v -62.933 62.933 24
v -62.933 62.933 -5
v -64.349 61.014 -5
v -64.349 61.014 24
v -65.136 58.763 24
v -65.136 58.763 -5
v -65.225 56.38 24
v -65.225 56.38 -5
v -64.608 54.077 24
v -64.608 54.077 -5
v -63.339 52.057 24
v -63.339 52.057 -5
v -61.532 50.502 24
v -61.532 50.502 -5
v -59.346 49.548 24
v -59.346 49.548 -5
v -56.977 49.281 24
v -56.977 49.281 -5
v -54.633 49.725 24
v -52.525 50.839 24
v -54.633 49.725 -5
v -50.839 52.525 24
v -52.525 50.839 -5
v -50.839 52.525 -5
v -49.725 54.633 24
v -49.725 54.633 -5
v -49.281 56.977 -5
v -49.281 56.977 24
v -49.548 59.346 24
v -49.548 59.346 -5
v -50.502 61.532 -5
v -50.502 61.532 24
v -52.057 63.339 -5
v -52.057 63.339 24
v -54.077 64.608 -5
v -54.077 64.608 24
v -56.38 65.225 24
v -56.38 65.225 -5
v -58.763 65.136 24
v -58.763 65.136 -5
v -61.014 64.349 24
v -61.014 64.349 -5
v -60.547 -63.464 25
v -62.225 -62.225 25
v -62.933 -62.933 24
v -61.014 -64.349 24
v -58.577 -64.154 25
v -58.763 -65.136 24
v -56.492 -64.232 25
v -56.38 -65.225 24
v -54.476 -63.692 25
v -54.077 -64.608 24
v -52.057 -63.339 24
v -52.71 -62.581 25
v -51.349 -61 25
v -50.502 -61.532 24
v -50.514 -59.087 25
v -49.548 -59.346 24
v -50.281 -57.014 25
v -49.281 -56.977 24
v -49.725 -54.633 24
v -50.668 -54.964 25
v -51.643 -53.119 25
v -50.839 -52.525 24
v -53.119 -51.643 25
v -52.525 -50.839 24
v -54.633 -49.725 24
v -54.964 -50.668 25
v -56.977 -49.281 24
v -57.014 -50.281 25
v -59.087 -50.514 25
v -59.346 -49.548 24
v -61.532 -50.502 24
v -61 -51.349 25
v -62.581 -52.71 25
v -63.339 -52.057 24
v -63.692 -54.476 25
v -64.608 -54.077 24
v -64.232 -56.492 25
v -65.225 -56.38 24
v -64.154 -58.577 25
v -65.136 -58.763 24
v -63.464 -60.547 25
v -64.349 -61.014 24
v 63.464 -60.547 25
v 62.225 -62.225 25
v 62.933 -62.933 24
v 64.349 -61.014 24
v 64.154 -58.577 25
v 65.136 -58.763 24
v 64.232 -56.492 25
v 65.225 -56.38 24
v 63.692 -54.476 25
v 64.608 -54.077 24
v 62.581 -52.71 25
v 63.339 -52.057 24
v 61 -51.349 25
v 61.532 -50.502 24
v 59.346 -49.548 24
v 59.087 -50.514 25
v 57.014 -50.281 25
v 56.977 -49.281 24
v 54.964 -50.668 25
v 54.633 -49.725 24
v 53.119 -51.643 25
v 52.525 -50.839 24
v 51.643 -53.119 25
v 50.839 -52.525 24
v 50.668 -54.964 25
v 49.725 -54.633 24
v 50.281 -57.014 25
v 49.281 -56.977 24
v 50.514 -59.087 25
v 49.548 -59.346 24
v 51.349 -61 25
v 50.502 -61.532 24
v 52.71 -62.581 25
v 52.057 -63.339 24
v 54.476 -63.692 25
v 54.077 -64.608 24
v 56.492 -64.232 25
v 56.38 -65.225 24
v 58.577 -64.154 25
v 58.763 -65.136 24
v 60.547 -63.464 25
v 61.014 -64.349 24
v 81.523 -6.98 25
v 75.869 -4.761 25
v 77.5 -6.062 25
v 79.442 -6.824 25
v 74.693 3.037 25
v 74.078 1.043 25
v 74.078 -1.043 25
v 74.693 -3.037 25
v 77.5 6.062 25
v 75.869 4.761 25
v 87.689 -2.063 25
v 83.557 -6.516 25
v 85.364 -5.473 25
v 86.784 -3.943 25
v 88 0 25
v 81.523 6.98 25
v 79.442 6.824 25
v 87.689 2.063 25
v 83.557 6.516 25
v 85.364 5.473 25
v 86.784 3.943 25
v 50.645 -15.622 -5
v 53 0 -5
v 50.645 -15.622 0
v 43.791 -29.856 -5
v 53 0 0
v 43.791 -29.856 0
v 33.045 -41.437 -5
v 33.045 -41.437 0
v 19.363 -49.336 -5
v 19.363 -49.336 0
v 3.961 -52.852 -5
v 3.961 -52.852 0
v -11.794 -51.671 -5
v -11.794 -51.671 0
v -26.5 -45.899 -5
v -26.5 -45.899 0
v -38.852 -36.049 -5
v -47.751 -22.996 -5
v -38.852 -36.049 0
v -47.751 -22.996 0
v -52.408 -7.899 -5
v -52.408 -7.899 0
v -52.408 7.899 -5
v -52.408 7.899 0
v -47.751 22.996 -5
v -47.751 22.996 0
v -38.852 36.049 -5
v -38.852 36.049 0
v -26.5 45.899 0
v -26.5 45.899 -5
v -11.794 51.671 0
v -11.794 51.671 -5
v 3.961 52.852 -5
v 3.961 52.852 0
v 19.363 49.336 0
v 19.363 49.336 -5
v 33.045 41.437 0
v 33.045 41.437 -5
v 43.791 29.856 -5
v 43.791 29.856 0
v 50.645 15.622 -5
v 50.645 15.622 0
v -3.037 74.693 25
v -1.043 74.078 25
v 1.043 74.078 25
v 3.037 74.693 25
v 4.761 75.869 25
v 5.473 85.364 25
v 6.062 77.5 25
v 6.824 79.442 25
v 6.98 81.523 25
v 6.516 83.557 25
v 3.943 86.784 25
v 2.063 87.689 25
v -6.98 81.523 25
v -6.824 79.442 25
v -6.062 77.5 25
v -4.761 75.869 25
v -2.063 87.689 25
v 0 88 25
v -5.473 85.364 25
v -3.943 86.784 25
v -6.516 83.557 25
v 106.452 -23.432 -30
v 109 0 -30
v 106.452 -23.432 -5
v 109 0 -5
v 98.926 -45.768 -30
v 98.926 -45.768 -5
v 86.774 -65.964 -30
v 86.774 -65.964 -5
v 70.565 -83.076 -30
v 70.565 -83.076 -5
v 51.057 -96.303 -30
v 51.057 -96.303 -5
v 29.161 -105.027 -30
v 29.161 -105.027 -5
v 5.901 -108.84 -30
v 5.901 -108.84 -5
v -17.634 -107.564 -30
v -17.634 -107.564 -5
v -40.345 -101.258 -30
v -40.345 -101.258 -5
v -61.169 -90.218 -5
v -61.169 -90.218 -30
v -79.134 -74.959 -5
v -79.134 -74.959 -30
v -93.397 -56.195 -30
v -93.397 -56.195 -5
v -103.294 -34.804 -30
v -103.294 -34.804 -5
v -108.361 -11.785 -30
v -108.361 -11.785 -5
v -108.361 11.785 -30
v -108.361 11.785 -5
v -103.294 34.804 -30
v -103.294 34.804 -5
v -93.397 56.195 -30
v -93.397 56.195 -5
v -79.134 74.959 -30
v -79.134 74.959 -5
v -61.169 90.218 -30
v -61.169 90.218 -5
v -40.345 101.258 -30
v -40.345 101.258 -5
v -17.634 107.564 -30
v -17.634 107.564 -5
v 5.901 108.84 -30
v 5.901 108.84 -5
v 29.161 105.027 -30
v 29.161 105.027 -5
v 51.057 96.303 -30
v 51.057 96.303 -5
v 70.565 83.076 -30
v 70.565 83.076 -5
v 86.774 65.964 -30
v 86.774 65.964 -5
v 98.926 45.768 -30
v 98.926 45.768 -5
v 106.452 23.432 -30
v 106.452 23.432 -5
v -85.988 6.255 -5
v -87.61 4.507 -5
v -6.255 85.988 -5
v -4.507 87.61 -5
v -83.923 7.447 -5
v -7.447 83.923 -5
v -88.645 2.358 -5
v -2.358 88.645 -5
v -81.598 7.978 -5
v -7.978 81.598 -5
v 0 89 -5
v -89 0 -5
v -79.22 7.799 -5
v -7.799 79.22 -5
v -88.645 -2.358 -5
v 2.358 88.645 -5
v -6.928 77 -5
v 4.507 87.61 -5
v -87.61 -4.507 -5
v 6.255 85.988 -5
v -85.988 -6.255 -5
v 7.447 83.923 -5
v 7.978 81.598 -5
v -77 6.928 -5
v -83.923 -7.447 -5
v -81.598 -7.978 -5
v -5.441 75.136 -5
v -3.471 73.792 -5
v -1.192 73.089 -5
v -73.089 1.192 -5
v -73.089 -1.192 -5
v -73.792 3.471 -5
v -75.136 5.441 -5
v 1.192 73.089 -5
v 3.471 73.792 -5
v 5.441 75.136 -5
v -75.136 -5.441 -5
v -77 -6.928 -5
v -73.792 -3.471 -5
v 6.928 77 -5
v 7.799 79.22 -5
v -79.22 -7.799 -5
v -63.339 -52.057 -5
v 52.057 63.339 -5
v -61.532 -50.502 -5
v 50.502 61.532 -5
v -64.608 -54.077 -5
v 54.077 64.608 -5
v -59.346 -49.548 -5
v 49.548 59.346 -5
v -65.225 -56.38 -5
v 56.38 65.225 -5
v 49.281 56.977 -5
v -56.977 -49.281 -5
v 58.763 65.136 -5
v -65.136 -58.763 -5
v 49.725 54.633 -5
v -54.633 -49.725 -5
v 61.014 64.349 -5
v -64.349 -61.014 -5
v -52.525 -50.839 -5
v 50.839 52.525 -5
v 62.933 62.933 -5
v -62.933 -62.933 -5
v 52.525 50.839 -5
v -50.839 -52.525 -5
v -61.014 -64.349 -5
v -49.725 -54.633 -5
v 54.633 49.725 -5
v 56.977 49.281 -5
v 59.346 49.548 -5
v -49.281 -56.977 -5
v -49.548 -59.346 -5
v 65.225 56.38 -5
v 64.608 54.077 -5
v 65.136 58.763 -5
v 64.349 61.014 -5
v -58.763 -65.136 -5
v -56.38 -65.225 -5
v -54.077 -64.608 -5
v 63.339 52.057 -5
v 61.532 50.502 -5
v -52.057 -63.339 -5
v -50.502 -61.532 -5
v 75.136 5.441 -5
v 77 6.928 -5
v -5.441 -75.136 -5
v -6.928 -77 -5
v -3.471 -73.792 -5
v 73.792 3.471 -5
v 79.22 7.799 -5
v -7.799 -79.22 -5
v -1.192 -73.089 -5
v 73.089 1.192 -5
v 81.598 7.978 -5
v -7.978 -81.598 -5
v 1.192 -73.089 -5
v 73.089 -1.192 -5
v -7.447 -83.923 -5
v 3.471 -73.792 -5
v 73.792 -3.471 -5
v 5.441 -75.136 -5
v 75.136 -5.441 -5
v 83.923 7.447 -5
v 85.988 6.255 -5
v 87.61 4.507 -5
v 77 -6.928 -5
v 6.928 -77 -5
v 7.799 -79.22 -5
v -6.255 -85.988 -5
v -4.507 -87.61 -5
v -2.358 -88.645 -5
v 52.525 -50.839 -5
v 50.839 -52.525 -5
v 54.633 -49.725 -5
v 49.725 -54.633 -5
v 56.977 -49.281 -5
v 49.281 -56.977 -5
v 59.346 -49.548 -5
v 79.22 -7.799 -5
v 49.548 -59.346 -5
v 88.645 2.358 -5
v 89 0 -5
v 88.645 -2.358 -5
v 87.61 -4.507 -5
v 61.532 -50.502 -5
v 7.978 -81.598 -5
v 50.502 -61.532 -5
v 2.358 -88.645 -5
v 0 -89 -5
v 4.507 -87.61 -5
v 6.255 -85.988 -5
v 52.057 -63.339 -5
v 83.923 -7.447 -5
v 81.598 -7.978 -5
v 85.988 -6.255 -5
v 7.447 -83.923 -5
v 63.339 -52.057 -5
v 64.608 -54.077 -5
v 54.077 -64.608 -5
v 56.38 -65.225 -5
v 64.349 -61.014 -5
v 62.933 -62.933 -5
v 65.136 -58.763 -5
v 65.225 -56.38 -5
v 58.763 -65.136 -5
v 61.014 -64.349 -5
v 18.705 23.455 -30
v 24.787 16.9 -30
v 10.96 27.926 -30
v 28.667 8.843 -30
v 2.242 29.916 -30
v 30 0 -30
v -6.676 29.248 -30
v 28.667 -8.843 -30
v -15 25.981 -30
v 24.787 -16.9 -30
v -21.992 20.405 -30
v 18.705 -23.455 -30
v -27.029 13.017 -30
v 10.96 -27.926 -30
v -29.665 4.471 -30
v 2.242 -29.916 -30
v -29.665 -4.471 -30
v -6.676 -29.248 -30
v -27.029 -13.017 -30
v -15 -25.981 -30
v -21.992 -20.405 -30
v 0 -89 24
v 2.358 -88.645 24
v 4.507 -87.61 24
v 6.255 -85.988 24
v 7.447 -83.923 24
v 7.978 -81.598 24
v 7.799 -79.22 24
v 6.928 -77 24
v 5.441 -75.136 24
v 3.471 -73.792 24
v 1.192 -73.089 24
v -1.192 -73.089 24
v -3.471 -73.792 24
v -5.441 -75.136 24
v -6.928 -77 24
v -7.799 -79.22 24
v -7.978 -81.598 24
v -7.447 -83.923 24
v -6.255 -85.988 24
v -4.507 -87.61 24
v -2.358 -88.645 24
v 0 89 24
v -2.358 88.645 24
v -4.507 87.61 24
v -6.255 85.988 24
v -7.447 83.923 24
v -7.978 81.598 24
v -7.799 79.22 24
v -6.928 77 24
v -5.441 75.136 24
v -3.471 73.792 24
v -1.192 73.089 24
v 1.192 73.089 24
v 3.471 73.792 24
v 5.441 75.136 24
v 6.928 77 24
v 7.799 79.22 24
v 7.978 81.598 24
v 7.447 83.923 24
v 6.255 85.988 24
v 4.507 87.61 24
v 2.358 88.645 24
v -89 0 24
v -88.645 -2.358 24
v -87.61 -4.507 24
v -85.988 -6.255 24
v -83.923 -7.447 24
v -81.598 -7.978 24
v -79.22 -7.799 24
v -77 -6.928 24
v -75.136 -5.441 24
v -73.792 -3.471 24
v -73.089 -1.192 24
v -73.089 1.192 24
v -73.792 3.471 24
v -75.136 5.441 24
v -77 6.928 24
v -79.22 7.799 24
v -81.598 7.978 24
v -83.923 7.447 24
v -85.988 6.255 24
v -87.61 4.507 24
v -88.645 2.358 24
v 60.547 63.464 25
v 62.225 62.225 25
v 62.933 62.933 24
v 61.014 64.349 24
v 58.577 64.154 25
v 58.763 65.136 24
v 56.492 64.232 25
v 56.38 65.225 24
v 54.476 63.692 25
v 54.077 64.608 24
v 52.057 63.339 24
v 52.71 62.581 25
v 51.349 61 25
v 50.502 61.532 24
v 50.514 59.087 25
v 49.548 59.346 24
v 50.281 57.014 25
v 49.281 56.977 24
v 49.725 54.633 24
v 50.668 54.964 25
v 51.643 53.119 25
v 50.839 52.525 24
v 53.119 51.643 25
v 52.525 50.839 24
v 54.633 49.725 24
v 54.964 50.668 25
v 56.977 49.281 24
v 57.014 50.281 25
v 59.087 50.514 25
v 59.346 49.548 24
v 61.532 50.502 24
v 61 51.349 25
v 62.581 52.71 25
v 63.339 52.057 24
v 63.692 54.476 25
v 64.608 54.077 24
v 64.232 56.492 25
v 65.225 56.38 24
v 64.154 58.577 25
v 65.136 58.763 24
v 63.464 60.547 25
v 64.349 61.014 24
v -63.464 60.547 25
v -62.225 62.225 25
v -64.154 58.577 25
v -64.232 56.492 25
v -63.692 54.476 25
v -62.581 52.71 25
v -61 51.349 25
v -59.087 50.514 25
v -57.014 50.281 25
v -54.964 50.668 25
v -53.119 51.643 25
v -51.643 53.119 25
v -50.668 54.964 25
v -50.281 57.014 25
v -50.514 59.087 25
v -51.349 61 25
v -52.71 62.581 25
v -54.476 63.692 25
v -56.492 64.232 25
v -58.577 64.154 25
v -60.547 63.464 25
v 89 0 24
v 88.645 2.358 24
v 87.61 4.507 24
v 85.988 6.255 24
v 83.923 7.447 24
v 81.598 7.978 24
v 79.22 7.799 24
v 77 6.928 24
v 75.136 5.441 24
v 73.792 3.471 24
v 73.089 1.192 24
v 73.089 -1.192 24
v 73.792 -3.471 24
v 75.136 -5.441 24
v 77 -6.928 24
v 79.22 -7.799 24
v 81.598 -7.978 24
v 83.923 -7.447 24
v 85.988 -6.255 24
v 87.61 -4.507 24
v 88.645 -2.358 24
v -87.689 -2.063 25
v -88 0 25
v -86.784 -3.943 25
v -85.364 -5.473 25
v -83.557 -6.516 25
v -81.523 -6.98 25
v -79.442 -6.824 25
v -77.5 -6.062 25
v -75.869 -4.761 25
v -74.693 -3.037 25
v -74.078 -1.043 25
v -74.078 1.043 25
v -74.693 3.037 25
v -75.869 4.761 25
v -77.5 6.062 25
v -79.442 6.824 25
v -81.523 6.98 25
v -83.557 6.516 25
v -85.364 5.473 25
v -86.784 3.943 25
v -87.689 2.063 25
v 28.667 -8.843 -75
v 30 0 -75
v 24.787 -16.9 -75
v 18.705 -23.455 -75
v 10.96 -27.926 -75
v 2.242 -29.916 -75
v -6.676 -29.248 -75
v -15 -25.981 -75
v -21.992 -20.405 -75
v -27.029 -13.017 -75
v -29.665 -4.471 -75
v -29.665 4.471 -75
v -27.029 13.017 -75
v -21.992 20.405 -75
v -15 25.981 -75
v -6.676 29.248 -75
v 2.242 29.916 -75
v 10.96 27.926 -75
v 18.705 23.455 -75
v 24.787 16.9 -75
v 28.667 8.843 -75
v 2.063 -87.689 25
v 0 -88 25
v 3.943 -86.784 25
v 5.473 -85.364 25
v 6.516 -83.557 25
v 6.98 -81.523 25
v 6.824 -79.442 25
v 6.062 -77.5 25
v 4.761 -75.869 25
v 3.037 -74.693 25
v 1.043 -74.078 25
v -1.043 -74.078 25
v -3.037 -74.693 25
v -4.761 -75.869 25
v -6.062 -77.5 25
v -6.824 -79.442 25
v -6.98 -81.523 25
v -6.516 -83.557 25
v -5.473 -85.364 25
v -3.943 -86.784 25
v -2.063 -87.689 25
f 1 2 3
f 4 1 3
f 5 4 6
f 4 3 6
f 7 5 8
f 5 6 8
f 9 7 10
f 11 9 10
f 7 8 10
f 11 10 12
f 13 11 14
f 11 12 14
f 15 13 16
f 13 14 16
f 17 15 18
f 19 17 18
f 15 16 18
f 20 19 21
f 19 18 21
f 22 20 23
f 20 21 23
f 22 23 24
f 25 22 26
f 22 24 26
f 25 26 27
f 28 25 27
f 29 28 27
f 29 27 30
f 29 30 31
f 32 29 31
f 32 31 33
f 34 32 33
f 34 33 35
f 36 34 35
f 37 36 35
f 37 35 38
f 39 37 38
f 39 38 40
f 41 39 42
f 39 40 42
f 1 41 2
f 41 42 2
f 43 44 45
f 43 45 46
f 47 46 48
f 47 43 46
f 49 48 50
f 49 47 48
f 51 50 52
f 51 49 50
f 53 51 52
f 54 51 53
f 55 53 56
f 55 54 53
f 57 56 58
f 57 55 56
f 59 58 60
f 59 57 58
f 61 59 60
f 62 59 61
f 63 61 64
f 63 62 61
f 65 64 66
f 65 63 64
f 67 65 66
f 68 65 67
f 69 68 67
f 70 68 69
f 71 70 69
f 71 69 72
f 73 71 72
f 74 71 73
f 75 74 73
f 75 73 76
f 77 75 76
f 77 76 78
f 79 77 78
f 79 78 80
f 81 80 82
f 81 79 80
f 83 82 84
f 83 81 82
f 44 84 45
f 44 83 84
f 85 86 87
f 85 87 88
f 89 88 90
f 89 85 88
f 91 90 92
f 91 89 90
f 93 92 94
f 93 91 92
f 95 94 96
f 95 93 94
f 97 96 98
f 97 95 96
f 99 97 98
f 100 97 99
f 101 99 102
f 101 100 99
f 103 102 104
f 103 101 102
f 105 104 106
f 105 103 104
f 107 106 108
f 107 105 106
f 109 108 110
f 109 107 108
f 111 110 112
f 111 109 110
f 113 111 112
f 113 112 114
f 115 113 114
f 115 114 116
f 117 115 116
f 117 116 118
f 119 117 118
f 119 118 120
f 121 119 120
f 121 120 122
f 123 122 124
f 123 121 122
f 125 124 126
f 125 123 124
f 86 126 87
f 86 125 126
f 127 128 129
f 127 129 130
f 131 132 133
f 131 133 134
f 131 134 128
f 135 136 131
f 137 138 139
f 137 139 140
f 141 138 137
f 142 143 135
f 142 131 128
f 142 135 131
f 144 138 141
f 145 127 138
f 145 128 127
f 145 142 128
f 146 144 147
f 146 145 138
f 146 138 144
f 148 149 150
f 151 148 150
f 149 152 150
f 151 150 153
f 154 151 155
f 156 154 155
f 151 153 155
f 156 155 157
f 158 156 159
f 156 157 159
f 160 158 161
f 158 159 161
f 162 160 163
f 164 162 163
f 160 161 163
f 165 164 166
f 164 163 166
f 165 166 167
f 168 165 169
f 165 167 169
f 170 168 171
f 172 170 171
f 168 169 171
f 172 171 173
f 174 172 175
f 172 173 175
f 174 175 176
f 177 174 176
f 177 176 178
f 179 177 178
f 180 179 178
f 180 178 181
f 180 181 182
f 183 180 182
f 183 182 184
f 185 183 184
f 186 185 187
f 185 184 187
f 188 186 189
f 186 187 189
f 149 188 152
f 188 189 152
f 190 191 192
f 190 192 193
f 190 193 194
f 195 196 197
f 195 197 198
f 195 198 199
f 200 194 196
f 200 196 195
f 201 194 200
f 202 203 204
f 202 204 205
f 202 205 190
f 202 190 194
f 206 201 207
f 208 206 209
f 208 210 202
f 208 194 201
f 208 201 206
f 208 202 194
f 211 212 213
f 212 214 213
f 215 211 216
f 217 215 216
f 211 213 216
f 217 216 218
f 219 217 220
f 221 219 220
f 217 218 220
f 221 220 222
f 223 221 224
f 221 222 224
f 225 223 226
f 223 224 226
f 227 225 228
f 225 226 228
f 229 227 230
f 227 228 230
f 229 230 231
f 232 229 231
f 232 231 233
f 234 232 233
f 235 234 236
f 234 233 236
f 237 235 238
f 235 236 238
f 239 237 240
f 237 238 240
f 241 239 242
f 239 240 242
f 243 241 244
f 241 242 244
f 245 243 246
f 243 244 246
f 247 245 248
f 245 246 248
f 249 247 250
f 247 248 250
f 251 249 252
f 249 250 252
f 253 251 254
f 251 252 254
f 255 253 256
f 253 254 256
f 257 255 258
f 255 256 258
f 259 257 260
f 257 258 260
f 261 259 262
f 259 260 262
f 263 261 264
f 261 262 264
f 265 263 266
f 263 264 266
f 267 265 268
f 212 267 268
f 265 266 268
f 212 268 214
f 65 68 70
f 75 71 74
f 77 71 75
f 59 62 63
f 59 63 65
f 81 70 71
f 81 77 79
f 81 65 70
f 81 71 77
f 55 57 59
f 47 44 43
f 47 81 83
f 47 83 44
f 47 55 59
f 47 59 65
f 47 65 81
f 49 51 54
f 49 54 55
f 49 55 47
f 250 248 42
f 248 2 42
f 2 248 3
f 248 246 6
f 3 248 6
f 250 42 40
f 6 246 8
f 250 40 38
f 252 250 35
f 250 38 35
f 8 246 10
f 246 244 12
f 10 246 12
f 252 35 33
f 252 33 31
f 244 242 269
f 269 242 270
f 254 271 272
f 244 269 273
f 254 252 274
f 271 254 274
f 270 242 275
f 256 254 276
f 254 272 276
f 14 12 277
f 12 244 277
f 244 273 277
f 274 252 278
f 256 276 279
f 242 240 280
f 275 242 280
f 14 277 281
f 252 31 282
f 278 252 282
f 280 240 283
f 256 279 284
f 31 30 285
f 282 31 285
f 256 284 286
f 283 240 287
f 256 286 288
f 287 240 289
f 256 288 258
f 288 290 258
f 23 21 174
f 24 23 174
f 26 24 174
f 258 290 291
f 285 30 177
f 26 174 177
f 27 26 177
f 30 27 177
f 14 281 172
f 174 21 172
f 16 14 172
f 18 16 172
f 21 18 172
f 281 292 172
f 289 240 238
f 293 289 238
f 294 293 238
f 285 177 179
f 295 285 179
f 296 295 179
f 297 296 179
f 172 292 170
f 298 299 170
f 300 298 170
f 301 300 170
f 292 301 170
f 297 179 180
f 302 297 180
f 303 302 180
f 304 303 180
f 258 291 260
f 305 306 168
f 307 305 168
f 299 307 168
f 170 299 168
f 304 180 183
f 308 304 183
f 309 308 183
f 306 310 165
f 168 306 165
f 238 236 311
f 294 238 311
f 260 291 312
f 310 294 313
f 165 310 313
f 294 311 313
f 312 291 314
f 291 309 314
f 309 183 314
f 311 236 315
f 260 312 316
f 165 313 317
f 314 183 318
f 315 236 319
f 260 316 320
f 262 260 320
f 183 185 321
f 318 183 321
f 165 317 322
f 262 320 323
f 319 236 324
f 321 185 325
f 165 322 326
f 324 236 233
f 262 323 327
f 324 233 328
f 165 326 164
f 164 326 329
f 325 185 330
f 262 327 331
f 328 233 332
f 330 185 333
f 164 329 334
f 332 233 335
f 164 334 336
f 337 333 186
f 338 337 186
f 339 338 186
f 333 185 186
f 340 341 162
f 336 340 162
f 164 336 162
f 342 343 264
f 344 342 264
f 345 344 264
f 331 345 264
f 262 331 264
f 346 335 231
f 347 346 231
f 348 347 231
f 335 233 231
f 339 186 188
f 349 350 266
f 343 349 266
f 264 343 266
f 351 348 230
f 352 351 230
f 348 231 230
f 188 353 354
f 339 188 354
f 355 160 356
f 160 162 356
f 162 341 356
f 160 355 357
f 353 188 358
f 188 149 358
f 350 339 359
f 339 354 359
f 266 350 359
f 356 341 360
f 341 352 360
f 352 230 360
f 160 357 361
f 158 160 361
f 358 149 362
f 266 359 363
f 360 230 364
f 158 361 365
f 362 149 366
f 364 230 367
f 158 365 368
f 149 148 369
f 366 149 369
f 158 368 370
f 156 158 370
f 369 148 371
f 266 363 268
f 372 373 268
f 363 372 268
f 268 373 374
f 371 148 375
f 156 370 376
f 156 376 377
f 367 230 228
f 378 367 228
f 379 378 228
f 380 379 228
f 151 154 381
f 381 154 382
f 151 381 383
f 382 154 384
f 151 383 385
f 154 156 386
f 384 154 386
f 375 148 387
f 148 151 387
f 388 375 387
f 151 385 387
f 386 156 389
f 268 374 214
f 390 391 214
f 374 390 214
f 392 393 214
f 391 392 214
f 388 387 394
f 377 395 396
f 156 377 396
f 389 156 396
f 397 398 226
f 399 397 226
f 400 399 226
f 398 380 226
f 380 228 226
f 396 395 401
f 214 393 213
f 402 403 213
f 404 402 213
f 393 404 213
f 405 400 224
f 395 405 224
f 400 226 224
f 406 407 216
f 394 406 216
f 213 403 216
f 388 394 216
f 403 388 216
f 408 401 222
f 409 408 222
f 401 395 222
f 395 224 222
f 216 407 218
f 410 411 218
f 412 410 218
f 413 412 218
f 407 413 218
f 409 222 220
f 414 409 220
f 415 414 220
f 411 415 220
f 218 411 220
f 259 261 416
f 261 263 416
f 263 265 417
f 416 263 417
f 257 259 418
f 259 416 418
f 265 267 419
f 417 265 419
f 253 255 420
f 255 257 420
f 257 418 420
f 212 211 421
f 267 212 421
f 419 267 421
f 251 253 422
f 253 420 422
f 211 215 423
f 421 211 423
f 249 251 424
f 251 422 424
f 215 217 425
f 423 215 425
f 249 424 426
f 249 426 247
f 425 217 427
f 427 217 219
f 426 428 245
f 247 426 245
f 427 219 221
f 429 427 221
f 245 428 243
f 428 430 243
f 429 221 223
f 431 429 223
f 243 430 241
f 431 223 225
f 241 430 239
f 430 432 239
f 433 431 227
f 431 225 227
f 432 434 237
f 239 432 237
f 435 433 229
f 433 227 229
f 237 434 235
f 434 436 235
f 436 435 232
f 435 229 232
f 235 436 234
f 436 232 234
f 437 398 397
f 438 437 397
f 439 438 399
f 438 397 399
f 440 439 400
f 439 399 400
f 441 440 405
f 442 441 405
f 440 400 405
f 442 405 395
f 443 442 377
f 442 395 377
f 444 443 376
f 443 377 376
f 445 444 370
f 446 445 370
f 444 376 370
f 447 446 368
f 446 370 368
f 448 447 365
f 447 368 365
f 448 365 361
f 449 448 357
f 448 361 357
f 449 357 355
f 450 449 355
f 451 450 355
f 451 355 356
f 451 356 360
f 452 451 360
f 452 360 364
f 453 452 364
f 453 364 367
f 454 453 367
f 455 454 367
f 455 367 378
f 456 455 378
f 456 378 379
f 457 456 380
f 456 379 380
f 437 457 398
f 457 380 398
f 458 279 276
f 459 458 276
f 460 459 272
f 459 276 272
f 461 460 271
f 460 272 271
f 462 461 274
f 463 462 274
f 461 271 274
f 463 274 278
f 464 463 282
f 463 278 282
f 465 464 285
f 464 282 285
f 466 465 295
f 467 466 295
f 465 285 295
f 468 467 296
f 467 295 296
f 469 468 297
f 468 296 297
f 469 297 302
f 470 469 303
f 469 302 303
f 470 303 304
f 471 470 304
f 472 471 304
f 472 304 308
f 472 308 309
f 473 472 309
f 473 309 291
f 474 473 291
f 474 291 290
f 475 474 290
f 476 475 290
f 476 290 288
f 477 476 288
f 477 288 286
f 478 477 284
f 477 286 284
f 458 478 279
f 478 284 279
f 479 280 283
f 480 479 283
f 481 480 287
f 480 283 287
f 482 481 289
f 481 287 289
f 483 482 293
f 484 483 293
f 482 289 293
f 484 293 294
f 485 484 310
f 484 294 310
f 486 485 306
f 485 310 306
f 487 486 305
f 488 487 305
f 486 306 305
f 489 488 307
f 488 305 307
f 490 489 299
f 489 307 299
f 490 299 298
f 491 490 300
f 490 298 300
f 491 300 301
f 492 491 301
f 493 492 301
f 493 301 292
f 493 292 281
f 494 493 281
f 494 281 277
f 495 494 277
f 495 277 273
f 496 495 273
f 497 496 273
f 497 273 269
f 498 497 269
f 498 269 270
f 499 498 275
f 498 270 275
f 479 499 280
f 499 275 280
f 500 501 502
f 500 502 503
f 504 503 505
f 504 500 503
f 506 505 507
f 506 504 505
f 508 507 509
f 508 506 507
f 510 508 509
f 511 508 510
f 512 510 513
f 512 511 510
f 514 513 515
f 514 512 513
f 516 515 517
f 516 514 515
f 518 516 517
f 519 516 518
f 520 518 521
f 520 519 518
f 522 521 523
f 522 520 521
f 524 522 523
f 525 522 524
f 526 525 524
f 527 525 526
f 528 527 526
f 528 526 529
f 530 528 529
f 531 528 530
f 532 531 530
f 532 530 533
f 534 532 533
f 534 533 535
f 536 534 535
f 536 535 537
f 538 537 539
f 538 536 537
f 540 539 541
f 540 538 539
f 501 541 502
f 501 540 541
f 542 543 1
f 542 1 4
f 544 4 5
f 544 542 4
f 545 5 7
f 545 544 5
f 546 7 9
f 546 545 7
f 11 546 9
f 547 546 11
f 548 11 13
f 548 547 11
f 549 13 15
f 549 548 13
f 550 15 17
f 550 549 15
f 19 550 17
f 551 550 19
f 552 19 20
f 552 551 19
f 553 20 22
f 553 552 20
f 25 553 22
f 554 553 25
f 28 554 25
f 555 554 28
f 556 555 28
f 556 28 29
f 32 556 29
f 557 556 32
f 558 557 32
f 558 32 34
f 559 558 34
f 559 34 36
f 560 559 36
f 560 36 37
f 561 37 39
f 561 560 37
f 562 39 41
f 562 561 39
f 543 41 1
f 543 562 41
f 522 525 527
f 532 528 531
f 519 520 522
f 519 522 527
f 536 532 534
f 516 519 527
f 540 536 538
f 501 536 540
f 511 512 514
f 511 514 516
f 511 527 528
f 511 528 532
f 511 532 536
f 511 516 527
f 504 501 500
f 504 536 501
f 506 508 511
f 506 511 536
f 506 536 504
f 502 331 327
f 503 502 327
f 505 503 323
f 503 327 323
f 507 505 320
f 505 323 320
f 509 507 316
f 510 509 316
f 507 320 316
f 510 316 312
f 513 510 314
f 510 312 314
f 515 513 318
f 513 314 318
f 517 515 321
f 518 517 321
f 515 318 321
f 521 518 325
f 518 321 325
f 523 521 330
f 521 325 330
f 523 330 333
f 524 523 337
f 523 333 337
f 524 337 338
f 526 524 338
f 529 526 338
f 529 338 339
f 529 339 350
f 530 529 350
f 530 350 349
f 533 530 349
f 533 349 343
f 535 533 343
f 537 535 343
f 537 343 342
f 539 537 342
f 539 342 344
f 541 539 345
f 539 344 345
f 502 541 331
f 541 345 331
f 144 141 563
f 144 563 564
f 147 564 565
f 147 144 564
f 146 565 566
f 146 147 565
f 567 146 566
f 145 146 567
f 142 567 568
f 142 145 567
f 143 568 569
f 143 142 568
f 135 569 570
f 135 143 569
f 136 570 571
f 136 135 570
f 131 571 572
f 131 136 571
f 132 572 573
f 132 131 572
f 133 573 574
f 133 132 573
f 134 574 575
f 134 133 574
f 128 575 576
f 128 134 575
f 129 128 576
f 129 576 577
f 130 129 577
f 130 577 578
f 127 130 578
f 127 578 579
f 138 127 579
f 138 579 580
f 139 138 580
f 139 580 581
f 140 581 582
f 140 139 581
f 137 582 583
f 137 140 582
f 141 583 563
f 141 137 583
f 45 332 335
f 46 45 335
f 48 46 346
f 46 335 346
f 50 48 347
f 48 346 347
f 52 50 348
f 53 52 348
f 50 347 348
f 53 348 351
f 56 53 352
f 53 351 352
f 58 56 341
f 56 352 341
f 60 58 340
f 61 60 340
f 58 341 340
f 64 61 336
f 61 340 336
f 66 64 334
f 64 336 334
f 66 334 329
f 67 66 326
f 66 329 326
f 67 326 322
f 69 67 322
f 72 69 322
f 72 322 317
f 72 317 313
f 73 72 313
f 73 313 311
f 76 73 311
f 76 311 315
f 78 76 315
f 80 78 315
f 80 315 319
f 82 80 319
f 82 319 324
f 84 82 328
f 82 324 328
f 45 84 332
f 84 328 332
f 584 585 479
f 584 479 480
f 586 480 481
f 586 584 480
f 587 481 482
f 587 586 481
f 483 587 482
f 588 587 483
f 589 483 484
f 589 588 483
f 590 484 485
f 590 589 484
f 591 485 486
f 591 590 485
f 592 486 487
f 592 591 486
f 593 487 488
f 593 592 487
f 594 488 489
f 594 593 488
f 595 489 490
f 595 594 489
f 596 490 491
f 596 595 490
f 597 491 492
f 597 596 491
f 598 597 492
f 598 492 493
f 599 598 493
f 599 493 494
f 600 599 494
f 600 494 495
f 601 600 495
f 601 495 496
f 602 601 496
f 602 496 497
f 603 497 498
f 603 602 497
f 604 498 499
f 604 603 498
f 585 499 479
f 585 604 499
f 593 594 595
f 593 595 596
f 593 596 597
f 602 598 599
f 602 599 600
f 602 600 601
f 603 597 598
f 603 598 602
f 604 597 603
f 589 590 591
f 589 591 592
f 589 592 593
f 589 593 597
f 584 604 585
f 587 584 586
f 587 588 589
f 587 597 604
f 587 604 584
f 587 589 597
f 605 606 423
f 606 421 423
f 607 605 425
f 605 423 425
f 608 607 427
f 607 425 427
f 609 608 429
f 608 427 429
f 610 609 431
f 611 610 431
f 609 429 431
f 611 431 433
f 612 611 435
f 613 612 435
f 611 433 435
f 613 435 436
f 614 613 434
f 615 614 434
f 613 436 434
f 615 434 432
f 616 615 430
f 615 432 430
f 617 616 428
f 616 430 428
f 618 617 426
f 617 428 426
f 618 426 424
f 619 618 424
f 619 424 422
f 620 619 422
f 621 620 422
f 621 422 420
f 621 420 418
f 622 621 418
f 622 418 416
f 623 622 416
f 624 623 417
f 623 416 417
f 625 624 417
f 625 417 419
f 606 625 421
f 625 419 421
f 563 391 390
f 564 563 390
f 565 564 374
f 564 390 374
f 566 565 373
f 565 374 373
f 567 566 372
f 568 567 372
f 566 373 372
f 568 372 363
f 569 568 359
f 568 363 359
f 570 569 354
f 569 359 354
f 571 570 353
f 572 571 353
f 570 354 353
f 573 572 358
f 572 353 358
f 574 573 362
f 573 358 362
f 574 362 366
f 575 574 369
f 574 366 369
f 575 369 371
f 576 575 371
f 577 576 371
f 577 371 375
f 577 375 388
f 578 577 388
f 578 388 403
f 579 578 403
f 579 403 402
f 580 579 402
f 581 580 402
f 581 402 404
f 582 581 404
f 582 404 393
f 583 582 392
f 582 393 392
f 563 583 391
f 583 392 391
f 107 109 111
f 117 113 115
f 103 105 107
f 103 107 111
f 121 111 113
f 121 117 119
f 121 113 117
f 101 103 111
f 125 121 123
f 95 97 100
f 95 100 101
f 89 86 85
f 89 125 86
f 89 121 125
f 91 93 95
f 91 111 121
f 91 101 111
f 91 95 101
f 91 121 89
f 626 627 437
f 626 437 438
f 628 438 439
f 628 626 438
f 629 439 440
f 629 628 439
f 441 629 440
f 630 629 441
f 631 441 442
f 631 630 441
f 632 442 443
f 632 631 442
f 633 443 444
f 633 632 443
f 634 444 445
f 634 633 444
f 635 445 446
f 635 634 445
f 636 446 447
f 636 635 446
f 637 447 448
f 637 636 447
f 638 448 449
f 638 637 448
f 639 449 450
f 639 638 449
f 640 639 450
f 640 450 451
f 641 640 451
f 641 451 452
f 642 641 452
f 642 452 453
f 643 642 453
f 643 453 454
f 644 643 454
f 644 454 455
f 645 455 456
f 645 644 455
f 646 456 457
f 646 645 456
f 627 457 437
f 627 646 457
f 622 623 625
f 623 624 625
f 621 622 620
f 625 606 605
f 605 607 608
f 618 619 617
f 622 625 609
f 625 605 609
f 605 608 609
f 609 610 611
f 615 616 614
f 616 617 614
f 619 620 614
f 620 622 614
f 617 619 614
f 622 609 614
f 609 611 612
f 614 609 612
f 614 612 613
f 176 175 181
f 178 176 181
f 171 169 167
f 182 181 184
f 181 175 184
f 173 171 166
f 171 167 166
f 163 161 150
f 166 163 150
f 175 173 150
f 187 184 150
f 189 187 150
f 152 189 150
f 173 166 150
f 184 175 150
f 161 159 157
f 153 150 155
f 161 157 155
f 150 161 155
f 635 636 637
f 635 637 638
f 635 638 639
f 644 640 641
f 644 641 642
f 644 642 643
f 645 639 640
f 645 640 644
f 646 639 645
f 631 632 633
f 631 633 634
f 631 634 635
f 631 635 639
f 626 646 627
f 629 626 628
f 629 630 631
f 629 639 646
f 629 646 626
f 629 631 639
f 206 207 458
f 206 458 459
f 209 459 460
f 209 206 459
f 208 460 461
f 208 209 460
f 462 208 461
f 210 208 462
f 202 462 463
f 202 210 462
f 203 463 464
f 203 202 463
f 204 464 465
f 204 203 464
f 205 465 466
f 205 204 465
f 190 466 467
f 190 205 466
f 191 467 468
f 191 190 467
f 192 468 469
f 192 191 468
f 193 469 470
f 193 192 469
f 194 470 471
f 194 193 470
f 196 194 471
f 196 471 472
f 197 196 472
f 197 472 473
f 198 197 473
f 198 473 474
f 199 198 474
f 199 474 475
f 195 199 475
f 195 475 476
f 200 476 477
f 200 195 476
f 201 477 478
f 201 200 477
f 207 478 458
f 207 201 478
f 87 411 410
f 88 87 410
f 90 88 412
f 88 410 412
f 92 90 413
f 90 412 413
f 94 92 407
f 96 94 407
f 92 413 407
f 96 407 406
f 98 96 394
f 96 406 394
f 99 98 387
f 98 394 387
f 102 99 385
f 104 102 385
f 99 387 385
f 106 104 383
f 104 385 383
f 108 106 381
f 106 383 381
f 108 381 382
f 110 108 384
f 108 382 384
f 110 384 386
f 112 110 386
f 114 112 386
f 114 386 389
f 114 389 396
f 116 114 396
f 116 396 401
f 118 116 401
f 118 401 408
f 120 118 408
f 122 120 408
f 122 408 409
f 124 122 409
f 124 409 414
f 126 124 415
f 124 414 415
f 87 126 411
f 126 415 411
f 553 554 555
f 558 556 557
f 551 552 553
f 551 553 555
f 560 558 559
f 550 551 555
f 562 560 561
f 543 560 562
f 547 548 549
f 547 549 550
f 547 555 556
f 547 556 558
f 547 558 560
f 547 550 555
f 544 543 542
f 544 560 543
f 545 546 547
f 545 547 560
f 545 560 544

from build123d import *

# Parameters (mm, degrees)
SKETCH2_R                    = 8
BOSS_EXTRUDE1_DEPTH          = 30
CHAMFER1_SIZE                = 1
CIRPATTERN1_COUNT            = 8
CHAMFER1_OF_CIRPATTERN1_SIZE = 1


with BuildPart() as part:
    # Sketch1 → Revolve1 (revolve)
    with BuildSketch(Plane(origin=(0, 0, 0), x_dir=(1, 0, 0), z_dir=(0, 1, 0))):
        Polygon((0, 0), (0, 75), (30, 75), (30, 30), (109, 30), (109, 5), (53, 5), (53, 0), align=None)
    revolve(axis=Axis((0, 0, 0), (0, 0, -1)))

    # Sketch2 → Boss-Extrude1 (add)
    with BuildSketch(Plane.XY.offset(-5)):
        with Locations((81, 0)):
            Circle(SKETCH2_R)
    boss_extrude1 = extrude(amount=BOSS_EXTRUDE1_DEPTH)

    # Chamfer1
    chamfer1_edges = [part.edges().sort_by_distance(p)[0] for p in [
        (73, 0, 25),
    ]]
    chamfer(chamfer1_edges, length=CHAMFER1_SIZE)

    # CirPattern1: Boss-Extrude1 ×8 about axis
    cirpattern1_axis = Axis((0, 0, 0), (0, 0, 1))
    for i in range(1, CIRPATTERN1_COUNT):
        add(boss_extrude1.rotate(cirpattern1_axis, i * 360 / CIRPATTERN1_COUNT))

    # Chamfer1 of CirPattern1
    chamfer1_of_cirpattern1_edges = [part.edges().sort_by_distance(p)[0] for p in [
        (51.618795027, 51.618795027, 25),
        (0, 73, 25),
        (-51.618795027, 51.618795027, 25),
        (-73, 0, 25),
        (-51.618795027, -51.618795027, 25),
        (0, -73, 25),
        (51.618795027, -51.618795027, 25),
    ]]
    chamfer(chamfer1_of_cirpattern1_edges, length=CHAMFER1_OF_CIRPATTERN1_SIZE)


solid = part.part
